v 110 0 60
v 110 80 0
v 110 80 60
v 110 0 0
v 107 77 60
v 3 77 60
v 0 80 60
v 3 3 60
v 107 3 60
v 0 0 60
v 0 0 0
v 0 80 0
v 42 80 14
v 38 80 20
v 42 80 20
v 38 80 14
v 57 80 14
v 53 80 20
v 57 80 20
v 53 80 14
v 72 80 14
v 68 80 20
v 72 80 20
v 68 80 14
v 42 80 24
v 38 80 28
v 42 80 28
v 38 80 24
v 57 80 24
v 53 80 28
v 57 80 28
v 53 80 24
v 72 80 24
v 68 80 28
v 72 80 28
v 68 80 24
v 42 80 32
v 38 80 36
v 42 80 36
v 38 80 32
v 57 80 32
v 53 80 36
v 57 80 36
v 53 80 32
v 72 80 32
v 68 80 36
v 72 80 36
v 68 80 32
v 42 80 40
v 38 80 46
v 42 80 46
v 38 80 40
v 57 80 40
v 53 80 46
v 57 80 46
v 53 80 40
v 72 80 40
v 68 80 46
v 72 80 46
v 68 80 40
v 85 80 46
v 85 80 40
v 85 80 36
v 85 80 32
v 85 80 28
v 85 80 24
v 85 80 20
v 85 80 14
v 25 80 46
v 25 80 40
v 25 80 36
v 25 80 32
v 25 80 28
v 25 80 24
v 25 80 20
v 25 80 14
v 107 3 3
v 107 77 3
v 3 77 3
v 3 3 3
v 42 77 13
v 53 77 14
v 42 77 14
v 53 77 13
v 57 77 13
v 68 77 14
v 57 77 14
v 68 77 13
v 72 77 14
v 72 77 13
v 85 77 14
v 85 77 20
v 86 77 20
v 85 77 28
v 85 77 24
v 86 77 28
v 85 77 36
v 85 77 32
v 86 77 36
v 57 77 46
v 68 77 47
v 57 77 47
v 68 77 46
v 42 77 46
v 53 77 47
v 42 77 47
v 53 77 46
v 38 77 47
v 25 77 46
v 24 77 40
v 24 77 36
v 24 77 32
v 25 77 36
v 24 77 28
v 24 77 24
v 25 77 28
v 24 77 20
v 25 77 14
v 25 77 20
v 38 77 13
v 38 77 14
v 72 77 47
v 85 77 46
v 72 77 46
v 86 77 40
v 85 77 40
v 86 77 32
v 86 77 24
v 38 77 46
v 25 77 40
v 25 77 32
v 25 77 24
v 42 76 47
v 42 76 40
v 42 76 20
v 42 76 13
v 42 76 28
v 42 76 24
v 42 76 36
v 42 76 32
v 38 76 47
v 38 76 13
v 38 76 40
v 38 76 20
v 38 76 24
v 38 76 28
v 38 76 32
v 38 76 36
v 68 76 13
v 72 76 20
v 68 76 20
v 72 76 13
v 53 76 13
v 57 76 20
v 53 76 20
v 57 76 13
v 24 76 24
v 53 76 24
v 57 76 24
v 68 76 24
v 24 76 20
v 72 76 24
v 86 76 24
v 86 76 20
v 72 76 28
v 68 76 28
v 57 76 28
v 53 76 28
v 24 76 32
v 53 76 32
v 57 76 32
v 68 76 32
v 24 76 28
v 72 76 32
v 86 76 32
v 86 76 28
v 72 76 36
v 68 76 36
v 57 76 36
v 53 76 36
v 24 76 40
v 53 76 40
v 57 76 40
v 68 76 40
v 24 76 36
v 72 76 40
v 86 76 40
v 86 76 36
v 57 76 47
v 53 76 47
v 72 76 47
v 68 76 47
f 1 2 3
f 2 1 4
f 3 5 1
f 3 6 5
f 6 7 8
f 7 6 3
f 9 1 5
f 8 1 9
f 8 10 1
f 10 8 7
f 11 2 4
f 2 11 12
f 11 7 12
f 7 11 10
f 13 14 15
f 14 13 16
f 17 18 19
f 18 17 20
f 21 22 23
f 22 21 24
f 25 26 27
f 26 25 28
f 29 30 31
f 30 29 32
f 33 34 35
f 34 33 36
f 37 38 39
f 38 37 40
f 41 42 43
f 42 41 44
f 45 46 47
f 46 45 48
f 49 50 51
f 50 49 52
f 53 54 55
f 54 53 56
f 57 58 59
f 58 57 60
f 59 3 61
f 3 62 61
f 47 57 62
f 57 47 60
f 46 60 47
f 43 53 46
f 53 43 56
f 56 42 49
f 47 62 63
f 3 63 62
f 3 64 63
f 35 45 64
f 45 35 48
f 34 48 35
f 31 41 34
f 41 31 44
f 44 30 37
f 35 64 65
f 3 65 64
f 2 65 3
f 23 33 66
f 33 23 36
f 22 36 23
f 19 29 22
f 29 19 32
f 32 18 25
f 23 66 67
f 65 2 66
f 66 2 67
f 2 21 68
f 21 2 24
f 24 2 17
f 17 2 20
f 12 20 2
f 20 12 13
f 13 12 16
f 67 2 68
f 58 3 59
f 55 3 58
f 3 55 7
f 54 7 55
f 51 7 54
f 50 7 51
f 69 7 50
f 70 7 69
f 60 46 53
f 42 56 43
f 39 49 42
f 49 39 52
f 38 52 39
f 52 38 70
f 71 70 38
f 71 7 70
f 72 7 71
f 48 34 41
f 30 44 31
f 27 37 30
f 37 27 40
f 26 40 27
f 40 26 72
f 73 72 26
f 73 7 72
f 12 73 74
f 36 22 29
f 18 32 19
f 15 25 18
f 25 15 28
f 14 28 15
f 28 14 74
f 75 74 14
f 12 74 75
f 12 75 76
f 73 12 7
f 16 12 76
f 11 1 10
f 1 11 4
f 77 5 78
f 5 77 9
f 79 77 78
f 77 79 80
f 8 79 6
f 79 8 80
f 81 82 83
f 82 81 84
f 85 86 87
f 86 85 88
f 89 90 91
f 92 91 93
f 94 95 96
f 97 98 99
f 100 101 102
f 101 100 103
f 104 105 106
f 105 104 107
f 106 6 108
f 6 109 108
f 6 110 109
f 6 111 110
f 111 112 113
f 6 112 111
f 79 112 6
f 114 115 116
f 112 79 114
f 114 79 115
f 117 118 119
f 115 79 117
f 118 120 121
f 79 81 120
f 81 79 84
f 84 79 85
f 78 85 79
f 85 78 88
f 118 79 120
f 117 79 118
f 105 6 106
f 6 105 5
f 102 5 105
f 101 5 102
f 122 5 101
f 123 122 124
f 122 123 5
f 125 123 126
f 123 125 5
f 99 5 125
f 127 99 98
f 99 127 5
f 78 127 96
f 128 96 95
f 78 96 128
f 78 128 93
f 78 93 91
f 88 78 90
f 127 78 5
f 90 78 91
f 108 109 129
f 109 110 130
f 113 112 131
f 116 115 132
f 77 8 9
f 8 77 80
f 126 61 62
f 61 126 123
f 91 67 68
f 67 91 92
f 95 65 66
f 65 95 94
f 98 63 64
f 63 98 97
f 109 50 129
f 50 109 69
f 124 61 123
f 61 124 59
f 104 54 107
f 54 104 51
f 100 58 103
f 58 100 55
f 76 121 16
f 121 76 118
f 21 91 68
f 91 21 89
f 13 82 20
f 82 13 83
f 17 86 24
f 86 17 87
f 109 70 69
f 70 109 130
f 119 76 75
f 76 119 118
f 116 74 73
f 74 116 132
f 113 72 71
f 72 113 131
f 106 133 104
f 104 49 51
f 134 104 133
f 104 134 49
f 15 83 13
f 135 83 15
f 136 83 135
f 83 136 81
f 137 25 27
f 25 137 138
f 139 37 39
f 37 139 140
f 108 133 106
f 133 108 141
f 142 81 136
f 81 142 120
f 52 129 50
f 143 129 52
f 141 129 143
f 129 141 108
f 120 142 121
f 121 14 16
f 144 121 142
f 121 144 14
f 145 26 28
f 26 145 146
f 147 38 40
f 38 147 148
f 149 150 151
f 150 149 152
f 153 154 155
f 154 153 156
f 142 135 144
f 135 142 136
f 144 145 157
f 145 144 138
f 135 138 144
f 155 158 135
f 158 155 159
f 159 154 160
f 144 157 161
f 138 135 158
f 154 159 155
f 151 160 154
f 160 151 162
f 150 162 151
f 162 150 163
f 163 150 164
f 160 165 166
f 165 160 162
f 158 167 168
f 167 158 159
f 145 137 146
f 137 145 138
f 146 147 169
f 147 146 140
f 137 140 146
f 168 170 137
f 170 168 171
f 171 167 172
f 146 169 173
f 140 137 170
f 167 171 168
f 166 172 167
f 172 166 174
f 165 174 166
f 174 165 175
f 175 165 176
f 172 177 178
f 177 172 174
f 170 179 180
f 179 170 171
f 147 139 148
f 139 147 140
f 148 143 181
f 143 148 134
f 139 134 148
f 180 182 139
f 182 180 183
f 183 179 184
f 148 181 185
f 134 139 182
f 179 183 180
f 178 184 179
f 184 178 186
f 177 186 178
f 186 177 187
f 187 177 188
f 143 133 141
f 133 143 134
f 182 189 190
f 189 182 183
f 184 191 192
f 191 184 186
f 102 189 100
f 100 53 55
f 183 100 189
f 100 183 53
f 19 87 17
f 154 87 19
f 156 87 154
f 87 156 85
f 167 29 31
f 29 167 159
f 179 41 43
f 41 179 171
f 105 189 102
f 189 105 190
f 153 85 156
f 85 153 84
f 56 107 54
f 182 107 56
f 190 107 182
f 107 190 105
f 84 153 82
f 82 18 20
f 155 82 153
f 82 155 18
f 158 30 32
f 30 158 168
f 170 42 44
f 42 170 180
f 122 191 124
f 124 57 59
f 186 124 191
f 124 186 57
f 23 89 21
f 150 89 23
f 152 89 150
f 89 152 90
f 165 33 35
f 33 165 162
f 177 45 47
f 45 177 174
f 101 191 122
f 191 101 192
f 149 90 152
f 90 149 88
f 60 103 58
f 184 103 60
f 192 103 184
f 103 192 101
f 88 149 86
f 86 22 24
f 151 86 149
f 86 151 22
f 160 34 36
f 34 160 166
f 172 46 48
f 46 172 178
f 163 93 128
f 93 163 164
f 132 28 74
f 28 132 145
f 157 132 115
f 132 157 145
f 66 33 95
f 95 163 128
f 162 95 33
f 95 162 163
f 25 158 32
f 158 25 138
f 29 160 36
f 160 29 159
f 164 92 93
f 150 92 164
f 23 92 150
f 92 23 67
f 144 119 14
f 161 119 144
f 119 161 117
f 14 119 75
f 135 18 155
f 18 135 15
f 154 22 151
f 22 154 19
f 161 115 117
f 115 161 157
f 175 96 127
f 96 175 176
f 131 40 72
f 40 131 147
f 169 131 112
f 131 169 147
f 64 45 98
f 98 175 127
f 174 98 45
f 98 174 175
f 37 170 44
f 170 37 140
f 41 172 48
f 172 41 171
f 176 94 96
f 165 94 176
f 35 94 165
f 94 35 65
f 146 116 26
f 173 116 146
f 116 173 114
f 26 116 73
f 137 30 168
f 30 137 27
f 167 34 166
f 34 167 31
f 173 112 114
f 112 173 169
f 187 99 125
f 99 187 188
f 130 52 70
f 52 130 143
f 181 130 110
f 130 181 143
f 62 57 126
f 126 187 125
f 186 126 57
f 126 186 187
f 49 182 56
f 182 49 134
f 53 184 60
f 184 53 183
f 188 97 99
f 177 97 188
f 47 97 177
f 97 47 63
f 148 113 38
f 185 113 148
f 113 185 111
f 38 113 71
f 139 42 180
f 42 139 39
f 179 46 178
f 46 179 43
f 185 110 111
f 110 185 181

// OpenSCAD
$fn = 32;

// ----------------------------------------------------------------------
// Vent box: crossgrid enclosure
// ----------------------------------------------------------------------

// --- parameters (mm) ---
box_l = 110;              // box length, X
box_w = 80;               // box width, Y
box_h = 60;               // box height, Z
wall_t = 3;               // shell wall thickness
win_l = 60;               // vent window width, X
win_h = 32;               // vent window height, Z
bar_w = 4;                // grid bar width
n_v = 3;                  // vertical bar count
n_h = 3;                  // horizontal bar count

win_z0 = (box_h - win_h) / 2;  // window lower edge Z
v_step = win_l / (n_v + 1);  // vertical bar step
h_step = win_h / (n_h + 1);  // horizontal bar step

difference() {
  union() {
    difference() {
      cube([box_l, box_w, box_h]);
  translate([wall_t, wall_t, wall_t])
    cube([box_l - 2 * wall_t, box_w - 2 * wall_t, box_h]);
  translate([(box_l - win_l) / 2, box_w - wall_t - 1, win_z0])
    cube([win_l, wall_t + 2, win_h]);
    }
    for (i = [1 : n_v])
      translate([(box_l - win_l) / 2 + i * v_step - bar_w / 2,
                 box_w - wall_t - 1, win_z0 - 1])
        cube([bar_w, wall_t + 1, win_h + 2]);
    for (i = [1 : n_h])
      translate([(box_l - win_l) / 2 - 1, box_w - wall_t - 1,
                 win_z0 + i * h_step - bar_w / 2])
        cube([win_l + 2, wall_t + 1, bar_w]);
  }
}
